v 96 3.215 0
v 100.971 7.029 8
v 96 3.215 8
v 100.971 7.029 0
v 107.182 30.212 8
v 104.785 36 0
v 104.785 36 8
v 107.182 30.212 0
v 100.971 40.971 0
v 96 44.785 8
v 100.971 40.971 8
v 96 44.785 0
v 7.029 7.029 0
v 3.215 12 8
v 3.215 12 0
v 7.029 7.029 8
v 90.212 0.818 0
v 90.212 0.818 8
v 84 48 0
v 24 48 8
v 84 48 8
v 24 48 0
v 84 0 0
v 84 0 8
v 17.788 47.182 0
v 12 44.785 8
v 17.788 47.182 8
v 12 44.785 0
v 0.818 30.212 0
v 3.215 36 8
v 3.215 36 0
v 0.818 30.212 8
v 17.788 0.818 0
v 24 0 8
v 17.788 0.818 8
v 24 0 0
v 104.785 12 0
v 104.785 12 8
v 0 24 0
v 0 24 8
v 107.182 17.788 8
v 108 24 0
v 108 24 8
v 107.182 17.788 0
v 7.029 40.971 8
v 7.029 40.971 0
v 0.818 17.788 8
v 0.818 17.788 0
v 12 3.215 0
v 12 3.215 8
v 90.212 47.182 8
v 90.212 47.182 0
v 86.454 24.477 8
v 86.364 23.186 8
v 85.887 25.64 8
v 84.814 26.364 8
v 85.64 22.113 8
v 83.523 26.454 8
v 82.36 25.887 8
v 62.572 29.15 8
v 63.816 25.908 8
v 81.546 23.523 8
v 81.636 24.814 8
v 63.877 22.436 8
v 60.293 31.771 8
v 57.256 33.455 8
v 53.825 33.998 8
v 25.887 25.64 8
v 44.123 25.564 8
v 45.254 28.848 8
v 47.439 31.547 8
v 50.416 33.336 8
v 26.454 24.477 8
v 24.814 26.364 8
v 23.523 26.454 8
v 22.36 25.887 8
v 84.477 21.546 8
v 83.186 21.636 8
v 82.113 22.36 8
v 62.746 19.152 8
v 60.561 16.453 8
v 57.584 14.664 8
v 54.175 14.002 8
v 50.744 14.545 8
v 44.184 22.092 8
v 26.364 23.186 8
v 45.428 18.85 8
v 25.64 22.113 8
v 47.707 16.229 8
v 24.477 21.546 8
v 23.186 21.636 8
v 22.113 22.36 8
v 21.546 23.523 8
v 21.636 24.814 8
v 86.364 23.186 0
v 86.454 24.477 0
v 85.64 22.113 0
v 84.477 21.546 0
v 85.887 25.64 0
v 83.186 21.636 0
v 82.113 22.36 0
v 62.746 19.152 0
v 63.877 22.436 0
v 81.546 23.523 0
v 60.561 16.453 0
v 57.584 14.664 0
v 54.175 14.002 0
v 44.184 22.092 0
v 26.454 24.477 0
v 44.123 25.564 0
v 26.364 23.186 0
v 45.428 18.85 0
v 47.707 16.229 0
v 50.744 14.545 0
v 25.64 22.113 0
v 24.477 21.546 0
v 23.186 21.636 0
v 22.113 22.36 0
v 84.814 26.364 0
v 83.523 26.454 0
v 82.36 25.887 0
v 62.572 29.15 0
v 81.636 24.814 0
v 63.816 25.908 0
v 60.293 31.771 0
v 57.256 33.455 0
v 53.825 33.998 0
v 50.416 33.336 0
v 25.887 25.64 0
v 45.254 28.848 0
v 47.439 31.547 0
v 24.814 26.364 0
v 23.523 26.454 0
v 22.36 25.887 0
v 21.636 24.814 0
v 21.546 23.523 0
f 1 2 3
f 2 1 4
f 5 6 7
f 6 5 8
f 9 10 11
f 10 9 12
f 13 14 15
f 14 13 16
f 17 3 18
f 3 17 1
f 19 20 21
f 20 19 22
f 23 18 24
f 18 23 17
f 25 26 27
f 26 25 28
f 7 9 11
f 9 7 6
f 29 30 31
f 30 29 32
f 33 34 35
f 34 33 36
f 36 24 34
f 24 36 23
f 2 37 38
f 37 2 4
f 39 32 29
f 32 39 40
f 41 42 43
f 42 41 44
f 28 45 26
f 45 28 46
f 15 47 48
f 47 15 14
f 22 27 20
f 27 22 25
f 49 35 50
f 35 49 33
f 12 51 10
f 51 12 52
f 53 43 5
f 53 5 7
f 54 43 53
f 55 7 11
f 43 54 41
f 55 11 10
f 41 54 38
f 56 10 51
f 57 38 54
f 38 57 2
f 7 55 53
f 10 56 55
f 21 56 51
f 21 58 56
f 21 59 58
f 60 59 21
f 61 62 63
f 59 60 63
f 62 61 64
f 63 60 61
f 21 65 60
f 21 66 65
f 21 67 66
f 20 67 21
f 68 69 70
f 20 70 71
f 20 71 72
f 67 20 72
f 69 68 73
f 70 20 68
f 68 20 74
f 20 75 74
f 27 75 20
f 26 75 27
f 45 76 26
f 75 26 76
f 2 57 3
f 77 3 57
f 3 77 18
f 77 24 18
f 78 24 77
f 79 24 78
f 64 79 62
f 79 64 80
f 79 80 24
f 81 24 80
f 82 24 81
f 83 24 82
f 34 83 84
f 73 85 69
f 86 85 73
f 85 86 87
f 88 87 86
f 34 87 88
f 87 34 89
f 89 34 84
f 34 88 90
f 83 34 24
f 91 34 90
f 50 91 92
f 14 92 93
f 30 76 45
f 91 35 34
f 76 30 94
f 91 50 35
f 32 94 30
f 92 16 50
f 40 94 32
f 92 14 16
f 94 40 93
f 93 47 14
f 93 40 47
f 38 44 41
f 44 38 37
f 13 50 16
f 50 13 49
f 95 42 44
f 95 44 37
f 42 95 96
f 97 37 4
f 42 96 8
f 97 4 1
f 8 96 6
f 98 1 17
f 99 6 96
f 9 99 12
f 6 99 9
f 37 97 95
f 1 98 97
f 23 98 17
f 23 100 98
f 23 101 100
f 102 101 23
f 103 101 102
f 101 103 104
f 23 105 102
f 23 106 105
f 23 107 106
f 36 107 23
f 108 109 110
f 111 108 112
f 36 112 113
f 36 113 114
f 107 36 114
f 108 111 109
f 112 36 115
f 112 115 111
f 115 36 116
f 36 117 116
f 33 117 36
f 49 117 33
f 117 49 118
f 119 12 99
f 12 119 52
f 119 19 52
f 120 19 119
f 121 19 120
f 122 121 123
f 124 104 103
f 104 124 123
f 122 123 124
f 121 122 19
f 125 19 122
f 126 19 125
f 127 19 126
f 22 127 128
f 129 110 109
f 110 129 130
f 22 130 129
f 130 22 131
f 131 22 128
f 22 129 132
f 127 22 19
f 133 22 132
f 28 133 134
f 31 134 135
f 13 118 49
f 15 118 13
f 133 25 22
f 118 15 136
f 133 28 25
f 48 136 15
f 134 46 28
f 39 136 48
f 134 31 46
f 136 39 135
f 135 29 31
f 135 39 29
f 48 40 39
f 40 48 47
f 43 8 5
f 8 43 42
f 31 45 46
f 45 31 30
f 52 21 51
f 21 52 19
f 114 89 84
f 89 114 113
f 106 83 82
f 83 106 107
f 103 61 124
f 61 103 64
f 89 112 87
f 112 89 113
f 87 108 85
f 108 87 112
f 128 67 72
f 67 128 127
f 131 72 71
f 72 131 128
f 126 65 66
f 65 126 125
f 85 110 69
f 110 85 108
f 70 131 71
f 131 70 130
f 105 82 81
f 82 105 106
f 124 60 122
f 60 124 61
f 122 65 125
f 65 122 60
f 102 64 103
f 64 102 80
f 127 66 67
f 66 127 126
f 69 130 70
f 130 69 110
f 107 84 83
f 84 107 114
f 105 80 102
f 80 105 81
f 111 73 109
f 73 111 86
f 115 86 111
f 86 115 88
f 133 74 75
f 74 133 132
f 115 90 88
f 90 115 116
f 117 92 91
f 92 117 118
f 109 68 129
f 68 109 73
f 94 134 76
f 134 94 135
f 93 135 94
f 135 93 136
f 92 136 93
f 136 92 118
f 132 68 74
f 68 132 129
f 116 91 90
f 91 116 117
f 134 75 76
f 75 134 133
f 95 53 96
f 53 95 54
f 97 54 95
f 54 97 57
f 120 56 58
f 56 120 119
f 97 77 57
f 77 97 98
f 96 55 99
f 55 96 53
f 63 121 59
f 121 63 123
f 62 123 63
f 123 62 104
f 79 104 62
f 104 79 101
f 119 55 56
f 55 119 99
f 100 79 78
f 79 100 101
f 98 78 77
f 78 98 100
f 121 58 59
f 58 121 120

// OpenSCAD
$fn = 32;

// ----------------------------------------------------------------------
// Spacer plate: obround span 60, caps R24
// ----------------------------------------------------------------------

// --- parameters (mm) ---
bore_r = 10;              // centre bore radius
bolt_r = 2.5;             // bolt hole radius
plate_t = 8;              // plate thickness, Z (extrusion height)
span = 60;                // obround span
cap_r = 24;               // cap radius

profile = [[24, 48], [17.788, 47.182], [12, 44.785], [7.029, 40.971], [3.215, 36], [0.818, 30.212], [0, 24], [0.818, 17.788], [3.215, 12], [7.029, 7.029], [12, 3.215], [17.788, 0.818], [24, 0], [84, 0], [90.212, 0.818], [96, 3.215], [100.971, 7.029], [104.785, 12], [107.182, 17.788], [108, 24], [107.182, 30.212], [104.785, 36], [100.971, 40.971], [96, 44.785], [90.212, 47.182], [84, 48]];  // primary outline, 26 points, counter clockwise
void_1 = [[63.816, 25.908], [62.572, 29.15], [60.293, 31.771], [57.256, 33.455], [53.825, 33.998], [50.416, 33.336], [47.439, 31.547], [45.254, 28.848], [44.123, 25.564], [44.184, 22.092], [45.428, 18.85], [47.707, 16.229], [50.744, 14.545], [54.175, 14.002], [57.584, 14.664], [60.561, 16.453], [62.746, 19.152], [63.877, 22.436]];  // centre bore, 18 points
void_2 = [[26.454, 24.477], [25.887, 25.64], [24.814, 26.364], [23.523, 26.454], [22.36, 25.887], [21.636, 24.814], [21.546, 23.523], [22.113, 22.36], [23.186, 21.636], [24.477, 21.546], [25.64, 22.113], [26.364, 23.186]];  // end hole, 12 points
void_3 = [[86.454, 24.477], [85.887, 25.64], [84.814, 26.364], [83.523, 26.454], [82.36, 25.887], [81.636, 24.814], [81.546, 23.523], [82.113, 22.36], [83.186, 21.636], [84.477, 21.546], [85.64, 22.113], [86.364, 23.186]];  // end hole, 12 points

// --- the one profile operation ---
difference() {
  linear_extrude(height = plate_t) polygon(points = profile);
  translate([0, 0, -1])
    linear_extrude(height = plate_t + 2) polygon(points = void_1);
  translate([0, 0, -1])
    linear_extrude(height = plate_t + 2) polygon(points = void_2);
  translate([0, 0, -1])
    linear_extrude(height = plate_t + 2) polygon(points = void_3);
}
